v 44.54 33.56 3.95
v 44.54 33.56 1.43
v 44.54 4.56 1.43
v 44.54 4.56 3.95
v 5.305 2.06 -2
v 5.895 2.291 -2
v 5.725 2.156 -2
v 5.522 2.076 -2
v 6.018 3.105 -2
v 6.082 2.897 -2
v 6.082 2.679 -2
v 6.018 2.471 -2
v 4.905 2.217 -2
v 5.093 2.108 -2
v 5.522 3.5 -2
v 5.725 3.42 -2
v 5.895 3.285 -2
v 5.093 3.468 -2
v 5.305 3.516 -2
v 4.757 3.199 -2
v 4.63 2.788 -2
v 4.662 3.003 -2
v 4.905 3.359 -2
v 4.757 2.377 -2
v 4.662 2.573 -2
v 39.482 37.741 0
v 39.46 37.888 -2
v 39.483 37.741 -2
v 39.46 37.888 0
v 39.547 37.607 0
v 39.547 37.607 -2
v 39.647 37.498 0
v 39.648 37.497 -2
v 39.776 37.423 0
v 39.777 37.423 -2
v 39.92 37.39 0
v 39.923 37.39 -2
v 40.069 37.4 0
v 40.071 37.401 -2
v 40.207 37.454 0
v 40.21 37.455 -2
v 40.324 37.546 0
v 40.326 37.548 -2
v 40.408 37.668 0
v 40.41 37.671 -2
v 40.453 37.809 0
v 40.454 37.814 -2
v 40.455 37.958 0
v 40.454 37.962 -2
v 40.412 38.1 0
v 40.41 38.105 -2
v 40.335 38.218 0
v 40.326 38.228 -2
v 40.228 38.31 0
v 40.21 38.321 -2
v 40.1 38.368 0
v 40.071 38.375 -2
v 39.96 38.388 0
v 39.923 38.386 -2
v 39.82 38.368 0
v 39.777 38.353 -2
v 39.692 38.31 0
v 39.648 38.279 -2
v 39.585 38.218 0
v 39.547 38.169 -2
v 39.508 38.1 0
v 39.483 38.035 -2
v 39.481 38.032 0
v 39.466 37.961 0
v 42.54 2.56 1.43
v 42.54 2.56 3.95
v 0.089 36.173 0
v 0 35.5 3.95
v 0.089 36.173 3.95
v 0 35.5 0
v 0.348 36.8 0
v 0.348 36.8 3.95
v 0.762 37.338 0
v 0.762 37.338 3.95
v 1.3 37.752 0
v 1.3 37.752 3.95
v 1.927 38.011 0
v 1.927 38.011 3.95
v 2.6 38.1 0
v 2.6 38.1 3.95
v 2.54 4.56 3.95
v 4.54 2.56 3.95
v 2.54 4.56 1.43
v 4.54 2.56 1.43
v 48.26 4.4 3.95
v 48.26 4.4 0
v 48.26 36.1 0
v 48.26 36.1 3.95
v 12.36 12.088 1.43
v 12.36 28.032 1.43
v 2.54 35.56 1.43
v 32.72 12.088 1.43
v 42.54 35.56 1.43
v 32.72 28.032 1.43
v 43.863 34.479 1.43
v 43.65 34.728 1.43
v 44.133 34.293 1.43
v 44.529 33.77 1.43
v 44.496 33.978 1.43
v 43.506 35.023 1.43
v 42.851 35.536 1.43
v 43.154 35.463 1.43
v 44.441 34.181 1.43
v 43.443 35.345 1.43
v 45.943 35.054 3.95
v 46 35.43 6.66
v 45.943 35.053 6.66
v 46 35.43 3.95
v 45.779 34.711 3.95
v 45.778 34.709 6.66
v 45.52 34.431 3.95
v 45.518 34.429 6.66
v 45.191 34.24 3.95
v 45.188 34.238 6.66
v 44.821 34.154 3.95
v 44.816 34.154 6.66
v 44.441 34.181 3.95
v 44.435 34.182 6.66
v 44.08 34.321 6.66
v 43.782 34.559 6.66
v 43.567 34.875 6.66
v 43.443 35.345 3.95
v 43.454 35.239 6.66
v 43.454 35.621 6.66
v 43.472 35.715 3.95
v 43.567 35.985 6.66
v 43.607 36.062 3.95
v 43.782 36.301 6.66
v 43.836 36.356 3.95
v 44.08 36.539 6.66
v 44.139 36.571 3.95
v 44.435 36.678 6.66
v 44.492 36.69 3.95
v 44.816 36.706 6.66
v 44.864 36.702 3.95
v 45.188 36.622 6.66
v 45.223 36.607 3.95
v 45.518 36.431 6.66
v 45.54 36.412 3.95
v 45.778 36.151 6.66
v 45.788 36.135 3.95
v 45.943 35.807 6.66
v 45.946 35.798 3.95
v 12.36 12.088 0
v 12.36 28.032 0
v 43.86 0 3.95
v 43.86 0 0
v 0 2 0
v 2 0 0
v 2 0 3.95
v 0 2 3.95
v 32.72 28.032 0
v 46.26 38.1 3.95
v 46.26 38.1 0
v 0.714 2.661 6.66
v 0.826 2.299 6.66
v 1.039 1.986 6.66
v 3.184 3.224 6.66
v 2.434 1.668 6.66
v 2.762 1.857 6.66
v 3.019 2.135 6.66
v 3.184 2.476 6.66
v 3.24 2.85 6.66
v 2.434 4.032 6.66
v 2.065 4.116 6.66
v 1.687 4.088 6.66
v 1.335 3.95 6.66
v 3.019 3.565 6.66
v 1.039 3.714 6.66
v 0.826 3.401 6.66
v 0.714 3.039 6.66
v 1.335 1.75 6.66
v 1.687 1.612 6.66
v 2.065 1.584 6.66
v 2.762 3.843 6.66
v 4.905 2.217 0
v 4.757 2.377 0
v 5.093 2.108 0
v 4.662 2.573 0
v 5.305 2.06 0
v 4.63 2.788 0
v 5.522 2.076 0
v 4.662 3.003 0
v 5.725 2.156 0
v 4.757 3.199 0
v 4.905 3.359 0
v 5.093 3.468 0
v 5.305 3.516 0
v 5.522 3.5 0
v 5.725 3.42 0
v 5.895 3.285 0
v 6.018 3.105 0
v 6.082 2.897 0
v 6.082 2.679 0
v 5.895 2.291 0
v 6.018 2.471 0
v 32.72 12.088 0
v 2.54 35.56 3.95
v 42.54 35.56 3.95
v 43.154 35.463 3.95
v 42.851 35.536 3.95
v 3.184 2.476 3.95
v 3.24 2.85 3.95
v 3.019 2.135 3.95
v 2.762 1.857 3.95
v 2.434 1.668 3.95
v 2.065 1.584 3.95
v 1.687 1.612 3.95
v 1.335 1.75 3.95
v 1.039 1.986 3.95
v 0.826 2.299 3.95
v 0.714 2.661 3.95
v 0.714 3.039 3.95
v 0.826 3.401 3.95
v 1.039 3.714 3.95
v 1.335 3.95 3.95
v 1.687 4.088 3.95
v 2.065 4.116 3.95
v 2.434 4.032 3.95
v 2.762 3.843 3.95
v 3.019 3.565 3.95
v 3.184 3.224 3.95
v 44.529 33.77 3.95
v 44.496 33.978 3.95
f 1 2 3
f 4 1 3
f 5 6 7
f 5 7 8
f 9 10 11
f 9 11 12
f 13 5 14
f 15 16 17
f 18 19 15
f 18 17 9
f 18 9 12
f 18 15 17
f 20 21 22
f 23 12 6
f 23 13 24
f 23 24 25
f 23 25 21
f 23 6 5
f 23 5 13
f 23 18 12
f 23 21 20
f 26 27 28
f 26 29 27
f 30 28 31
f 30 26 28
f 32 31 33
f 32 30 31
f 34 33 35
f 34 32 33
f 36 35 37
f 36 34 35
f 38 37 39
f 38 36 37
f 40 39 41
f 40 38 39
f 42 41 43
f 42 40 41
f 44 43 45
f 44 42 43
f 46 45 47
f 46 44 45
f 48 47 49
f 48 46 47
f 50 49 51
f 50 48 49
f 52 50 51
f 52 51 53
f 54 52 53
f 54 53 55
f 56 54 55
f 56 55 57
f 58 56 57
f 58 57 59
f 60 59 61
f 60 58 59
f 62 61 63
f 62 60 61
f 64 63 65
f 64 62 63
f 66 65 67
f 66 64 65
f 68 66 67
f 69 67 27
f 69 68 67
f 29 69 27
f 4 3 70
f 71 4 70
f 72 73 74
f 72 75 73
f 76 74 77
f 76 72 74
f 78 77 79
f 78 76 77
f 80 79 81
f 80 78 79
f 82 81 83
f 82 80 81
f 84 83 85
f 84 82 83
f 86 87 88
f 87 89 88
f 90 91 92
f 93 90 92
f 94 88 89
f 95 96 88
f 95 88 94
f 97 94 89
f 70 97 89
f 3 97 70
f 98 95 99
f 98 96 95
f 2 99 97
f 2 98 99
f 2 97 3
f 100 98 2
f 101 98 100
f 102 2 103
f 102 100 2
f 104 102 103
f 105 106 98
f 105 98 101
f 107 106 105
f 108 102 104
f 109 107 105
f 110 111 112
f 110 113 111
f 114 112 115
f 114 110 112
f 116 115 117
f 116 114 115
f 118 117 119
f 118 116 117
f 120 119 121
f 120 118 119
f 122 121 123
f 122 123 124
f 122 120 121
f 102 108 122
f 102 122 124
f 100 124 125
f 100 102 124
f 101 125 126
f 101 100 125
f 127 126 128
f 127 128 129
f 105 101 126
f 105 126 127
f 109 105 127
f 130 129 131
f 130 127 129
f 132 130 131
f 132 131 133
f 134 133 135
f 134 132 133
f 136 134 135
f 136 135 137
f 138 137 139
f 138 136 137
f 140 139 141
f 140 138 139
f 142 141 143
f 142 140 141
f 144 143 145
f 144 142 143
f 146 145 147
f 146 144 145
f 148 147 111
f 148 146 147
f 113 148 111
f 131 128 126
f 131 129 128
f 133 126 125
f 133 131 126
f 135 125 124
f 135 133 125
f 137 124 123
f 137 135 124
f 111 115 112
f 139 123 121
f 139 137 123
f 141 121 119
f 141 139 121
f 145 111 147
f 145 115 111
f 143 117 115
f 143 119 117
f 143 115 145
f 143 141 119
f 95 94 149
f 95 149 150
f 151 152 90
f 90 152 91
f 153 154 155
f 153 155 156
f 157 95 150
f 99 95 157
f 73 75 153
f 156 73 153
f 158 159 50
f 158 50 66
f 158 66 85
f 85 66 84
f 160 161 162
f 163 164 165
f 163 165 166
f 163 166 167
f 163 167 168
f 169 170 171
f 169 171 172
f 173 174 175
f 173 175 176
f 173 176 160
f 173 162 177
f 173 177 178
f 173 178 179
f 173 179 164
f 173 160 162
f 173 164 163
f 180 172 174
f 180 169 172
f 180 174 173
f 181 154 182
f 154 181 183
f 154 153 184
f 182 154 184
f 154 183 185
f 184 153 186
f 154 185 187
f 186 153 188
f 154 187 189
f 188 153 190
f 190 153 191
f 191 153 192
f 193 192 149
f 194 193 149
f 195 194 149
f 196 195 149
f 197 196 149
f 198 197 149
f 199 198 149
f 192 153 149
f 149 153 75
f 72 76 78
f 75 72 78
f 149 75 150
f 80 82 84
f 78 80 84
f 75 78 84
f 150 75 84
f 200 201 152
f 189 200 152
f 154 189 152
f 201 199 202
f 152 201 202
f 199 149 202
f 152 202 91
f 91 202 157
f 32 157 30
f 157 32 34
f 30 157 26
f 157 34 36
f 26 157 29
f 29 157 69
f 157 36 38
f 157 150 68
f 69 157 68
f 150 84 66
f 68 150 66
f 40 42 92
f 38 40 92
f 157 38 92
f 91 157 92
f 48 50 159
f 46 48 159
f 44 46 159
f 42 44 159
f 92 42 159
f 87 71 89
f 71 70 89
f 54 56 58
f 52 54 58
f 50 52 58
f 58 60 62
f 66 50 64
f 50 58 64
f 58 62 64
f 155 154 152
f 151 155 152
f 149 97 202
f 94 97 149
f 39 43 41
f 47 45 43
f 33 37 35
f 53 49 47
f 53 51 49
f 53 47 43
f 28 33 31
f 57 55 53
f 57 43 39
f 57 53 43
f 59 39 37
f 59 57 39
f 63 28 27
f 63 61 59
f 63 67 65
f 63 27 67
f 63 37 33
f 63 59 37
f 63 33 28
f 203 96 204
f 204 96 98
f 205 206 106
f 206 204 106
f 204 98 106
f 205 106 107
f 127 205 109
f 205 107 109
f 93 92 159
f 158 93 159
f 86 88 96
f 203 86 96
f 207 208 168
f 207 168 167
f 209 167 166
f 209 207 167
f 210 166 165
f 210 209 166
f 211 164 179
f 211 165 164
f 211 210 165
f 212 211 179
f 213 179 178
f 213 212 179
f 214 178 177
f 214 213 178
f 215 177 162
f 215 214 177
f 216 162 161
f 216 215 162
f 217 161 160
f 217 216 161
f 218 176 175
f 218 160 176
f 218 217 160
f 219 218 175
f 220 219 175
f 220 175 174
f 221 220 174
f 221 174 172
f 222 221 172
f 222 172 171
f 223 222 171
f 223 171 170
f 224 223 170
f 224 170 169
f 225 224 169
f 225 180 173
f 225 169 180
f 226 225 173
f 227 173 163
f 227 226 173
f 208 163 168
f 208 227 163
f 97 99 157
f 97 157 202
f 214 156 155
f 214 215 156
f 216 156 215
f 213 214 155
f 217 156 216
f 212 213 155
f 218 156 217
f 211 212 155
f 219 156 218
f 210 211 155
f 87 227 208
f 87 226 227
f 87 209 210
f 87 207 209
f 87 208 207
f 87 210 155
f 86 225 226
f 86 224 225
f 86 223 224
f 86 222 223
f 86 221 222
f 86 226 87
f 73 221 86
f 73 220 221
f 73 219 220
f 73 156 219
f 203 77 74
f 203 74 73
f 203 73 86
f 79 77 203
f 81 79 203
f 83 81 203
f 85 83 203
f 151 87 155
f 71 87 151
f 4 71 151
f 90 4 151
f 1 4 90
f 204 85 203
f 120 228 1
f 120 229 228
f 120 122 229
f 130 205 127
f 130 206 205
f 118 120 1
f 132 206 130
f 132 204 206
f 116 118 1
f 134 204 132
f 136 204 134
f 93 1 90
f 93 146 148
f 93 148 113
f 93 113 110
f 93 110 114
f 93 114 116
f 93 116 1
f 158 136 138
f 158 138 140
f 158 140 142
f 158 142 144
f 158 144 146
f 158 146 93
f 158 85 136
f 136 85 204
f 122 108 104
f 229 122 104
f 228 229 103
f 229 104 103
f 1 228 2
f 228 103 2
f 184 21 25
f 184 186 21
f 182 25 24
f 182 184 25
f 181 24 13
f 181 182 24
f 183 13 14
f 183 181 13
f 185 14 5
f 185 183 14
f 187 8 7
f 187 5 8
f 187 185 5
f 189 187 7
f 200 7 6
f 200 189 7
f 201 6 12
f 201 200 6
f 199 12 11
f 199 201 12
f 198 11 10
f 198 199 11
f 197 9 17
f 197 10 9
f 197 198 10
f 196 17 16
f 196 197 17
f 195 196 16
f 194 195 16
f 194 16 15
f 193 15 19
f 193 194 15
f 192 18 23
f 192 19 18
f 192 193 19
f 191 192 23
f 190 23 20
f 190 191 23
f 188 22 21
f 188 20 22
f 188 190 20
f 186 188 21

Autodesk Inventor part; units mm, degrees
ref_plane "YZ Plane" through (0, 0, 0) normal (1, 0, 0) x (0, 1, 0)
ref_plane "XZ Plane" through (0, 0, 0) normal (0, 1, 0) x (-1, 0, 0)
ref_plane "XY Plane" through (0, 0, 0) normal (0, 0, 1) x (1, 0, 0)
sketch "Sketch1" plane through (0, 0, 0) normal (0, 0, 1) x (1, 0, 0)
  line L0 (2, 0) -> (43.86, 0)
  line L1 (48.26, 4.4) -> (48.26, 36.1)
  line L2 (46.26, 38.1) -> (2.6, 38.1)
  line L3 (0, 35.5) -> (0, 2)
  arc A0 (2.6, 38.1) -> (0, 35.5) centre (2.6, 35.5) ccw
  line L4 (2.54, 35.56) -> (42.54, 35.56)
  line L5 (44.54, 33.56) -> (44.54, 4.56)
  line L6 (42.54, 2.56) -> (4.54, 2.56)
  line L7 (2.54, 4.56) -> (2.54, 35.56)
  line L8 (43.86, 0) -> (48.26, 4.4)
  line L9 (44.54, 4.56) -> (42.54, 2.56)
  line L10 (4.54, 2.56) -> (2.54, 4.56)
  circle A1 centre (44.72, 35.43) radius 1.28
  circle A2 centre (1.97, 2.85) radius 1.27
  line L11 (2.54, 35.56) -> (44.54, 2.56) construction
  line L12 (44.54, 35.56) -> (2.54, 2.56) construction
  arc A3 (44.54, 33.56) -> (42.54, 35.56) centre (42.54, 33.56) ccw
  line L13 (48.26, 36.1) -> (46.26, 38.1)
  line L14 (2, 0) -> (0, 2)
  point P0 (0, 0)
  point P1 (48.26, 38.1)
  point P2 (48.26, 0)
  point P3 (0, 38.1)
  point P4 (4.2502, 2.8498)
  point P5 (2.916, 4.184)
  point P6 (43.4429, 35.3446)
  point P7 (44.4412, 34.1807)
  dimension "d0" = 38.1
  dimension "d1" = 48.26
  dimension "d2" = 2.6
  dimension "d3" = 33
  dimension "d4" = 42
  dimension "d5" = 2.54
  dimension "d6" = 2.54
  dimension "d7" = 4.4
  dimension "d8" = 4.4
  dimension "d9" = 2
  dimension "d10" = 2
  dimension "d11" = 2
  dimension "d12" = 2
  dimension "d13" = 44.72
  dimension "d14" = 2.56
  dimension "d15" = 2.67
  dimension "d16" = 2.54
  dimension "d27" = 2
  dimension "d28" = 2
  dimension "d29" = 2
  dimension "d30" = 1.97
  dimension "d31" = 2.85
  dimension "d32" = 2
  dimension "d33" = 2
extrude "Extrusion1" add sketch "Sketch1" along normal blind 1.43 contours L14 L3 A0 L2 L13 L1 L8 L0 | L4 A3 A1 L5 L9 L6 L10 L7 | A3 A1 | A1 A3 | A2
extrude "Extrusion2" add sketch "Sketch1" along normal blind 3.95
extrude "Extrusion3" add sketch "Sketch1" along normal blind 4 contours A3 A1 | A1 A3 | A2
extrude "Extrusion4" add sketch "Sketch1" along normal blind 6.66 contours A3 A1 | A1 A3 | A2
sketch "Sketch2" plane through (0, 0, 1.43) normal (0, 0, 1) x (1, 0, 0)
  line L0 (12.36, 28.032) -> (32.72, 28.032)
  line L1 (32.72, 28.032) -> (32.72, 12.088)
  line L2 (32.72, 12.088) -> (12.36, 12.088)
  line L3 (12.36, 12.088) -> (12.36, 28.032)
  line L4 (2.54, 35.56) -> (42.54, 35.56) projected
  line L5 (2.54, 4.56) -> (2.54, 35.56) projected
  point P0 (0, 0)
  point P1 (22.54, 28.032)
  point P2 (22.54, 35.56)
  point P3 (2.54, 20.06)
  point P4 (12.36, 20.06)
  dimension "d34" = 25.86
  dimension "d35" = 20.36
extrude "Extrusion5" cut sketch "Sketch2" against normal blind 4
sketch "Sketch3" plane through (0, 0, 0) normal (0, 0, -1) x (-1, 0, 0)
  circle A0 centre (-39.96, 37.888) radius 0.4997
  circle A1 centre (-5.36, 2.788) radius 0.73
  line L0 (-2, 0) -> (-43.86, 0) projected
  line L1 (0, 35.5) -> (0, 2) projected
  line L2 (-46.26, 38.1) -> (-2.6, 38.1) projected
  line L3 (-12.36, 12.088) -> (-12.36, 28.032) projected
  point P0 (0, 0)
  dimension "d40" = 1.46
  dimension "d45" = 34.6
  dimension "d46" = 35.1
  dimension "d47" = 7
  dimension "d48" = 9.3
extrude "Extrusion6" add sketch "Sketch3" along normal blind 2
equation "\"d8\" = d7"
equation "\"d10\" = d9"
equation "\"d12\" = d11"
equation "\"d29\" = d28"
equation "\"d33\" = d32"
properties part number "tray"
